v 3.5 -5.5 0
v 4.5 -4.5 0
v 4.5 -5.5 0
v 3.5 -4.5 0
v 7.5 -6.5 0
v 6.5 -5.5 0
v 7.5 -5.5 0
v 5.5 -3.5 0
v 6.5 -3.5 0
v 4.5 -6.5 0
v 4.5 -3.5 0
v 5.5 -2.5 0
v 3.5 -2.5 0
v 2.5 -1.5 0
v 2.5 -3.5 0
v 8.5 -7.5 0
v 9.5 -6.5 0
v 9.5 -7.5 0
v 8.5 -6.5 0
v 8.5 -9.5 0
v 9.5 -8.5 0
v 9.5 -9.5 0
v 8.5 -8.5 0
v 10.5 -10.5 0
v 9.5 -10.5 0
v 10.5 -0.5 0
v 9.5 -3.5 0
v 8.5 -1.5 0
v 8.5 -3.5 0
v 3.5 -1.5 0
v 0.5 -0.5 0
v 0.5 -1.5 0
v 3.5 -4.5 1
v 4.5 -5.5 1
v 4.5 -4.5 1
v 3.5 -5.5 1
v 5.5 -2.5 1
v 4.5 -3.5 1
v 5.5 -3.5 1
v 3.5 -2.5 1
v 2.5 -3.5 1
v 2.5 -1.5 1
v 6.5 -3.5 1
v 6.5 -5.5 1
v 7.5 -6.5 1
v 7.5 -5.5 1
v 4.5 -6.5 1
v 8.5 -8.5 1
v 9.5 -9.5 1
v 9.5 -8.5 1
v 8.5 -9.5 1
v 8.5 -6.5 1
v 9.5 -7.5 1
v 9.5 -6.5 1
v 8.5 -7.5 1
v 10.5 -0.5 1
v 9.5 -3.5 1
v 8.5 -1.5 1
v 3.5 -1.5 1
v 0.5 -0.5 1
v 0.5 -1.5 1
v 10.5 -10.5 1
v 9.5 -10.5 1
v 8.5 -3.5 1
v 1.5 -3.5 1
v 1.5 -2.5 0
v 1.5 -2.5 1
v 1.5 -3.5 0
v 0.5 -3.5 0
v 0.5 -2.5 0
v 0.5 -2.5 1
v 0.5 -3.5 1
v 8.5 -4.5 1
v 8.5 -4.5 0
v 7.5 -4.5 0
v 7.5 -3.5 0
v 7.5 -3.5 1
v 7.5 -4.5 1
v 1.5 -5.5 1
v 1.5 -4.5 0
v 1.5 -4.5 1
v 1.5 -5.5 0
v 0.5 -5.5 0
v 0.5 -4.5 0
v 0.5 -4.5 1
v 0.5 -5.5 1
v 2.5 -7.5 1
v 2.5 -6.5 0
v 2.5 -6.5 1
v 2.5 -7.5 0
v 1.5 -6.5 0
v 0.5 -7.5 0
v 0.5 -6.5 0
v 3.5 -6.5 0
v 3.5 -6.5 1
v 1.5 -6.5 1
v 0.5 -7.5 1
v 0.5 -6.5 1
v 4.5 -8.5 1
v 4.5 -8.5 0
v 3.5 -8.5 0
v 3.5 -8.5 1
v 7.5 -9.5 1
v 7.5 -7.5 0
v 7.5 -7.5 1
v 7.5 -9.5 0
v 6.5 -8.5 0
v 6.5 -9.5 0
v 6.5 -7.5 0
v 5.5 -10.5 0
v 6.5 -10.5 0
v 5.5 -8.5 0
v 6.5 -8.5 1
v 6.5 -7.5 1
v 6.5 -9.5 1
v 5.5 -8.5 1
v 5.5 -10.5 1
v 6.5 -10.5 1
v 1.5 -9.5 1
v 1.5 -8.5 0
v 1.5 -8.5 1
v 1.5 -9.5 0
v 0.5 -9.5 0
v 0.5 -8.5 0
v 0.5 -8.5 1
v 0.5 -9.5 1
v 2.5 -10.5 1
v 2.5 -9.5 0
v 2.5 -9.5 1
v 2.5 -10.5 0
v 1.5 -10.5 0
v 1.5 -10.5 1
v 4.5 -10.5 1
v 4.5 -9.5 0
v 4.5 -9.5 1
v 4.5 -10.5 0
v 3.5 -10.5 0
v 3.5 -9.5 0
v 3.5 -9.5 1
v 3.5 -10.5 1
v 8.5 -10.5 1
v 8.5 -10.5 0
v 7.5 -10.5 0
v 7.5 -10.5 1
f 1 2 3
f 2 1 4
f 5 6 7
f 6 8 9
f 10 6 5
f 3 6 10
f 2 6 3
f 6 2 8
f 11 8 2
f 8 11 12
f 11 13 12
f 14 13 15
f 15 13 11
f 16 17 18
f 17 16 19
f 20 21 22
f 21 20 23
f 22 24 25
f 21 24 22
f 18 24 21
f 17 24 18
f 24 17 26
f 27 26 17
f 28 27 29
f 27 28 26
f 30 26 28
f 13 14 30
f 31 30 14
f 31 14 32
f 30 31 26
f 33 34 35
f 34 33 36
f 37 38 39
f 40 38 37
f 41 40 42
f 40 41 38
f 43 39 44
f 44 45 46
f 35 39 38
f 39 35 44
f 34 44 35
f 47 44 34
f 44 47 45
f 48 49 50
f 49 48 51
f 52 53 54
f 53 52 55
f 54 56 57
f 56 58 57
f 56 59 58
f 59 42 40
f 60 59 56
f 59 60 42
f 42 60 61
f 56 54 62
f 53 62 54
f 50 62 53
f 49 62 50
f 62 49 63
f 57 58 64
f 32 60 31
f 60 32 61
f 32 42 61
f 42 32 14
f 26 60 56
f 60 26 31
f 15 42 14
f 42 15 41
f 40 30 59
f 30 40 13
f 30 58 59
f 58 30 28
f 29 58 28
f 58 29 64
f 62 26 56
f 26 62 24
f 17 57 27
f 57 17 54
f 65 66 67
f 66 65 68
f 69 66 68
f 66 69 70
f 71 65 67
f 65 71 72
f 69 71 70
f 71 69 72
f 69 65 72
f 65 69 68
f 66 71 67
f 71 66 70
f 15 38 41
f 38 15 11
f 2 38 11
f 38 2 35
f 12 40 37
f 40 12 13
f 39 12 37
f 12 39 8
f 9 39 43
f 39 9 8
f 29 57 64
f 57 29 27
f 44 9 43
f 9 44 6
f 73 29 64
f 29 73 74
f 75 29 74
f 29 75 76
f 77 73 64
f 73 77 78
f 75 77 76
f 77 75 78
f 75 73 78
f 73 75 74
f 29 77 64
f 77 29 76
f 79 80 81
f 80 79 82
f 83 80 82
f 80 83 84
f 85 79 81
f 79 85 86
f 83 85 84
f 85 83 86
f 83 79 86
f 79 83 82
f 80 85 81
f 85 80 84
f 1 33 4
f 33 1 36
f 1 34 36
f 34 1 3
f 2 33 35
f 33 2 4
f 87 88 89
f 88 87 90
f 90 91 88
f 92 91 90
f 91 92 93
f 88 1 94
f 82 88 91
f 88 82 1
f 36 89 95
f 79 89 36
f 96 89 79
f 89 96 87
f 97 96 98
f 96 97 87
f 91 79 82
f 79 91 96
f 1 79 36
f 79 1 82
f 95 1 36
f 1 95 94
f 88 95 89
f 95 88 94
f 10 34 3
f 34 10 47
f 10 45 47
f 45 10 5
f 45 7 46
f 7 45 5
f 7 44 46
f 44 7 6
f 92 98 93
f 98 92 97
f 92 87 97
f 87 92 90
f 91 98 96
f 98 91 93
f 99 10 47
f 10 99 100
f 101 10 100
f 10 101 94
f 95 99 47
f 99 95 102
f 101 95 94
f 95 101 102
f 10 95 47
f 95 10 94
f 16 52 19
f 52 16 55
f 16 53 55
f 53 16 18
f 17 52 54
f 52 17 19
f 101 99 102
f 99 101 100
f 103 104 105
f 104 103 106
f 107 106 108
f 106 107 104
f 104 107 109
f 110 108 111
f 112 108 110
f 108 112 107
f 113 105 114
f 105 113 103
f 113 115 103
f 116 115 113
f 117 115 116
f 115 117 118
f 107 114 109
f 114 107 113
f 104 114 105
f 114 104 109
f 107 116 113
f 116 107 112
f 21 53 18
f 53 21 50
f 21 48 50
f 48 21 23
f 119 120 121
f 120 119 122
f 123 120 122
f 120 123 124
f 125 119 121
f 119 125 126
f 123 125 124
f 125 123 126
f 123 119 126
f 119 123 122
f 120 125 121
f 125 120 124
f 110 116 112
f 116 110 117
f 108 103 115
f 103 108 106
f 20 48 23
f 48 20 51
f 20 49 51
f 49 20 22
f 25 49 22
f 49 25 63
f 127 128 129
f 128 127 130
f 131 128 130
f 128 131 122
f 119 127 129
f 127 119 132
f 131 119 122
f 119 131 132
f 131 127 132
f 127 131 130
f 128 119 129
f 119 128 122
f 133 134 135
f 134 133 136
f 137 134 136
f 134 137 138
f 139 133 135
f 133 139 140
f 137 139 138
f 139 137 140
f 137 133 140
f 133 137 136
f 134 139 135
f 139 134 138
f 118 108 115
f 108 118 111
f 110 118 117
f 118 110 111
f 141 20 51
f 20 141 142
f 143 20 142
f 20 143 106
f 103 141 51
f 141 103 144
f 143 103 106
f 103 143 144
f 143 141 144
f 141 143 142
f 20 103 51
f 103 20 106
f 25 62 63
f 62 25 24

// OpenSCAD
rotate([180,0,0])translate([0,0,-0.5]){
translate([1,1,0])  cube(size = [1,1,1], center=true);
translate([2,1,0])  cube(size = [1,1,1], center=true);
translate([3,1,0])  cube(size = [1,1,1], center=true);
translate([4,1,0])  cube(size = [1,1,1], center=true);
translate([5,1,0])  cube(size = [1,1,1], center=true);
translate([6,1,0])  cube(size = [1,1,1], center=true);
translate([7,1,0])  cube(size = [1,1,1], center=true);
translate([8,1,0])  cube(size = [1,1,1], center=true);
translate([9,1,0])  cube(size = [1,1,1], center=true);
translate([10,1,0])  cube(size = [1,1,1], center=true);
translate([10,1,0])  cube(size = [1,1,1], center=true);
translate([10,1,0])  cube(size = [1,1,1], center=true);
translate([3,2,0])  cube(size = [1,1,1], center=true);
translate([3,2,0])  cube(size = [1,1,1], center=true);
translate([3,2,0])  cube(size = [1,1,1], center=true);
translate([3,2,0])  cube(size = [1,1,1], center=true);
translate([3,2,0])  cube(size = [1,1,1], center=true);
translate([3,2,0])  cube(size = [1,1,1], center=true);
translate([9,2,0])  cube(size = [1,1,1], center=true);
translate([10,2,0])  cube(size = [1,1,1], center=true);
translate([1,3,0])  cube(size = [1,1,1], center=true);
translate([1,3,0])  cube(size = [1,1,1], center=true);
translate([3,3,0])  cube(size = [1,1,1], center=true);
translate([4,3,0])  cube(size = [1,1,1], center=true);
translate([5,3,0])  cube(size = [1,1,1], center=true);
translate([5,3,0])  cube(size = [1,1,1], center=true);
translate([5,3,0])  cube(size = [1,1,1], center=true);
translate([5,3,0])  cube(size = [1,1,1], center=true);
translate([9,3,0])  cube(size = [1,1,1], center=true);
translate([10,3,0])  cube(size = [1,1,1], center=true);
translate([10,3,0])  cube(size = [1,1,1], center=true);
translate([10,3,0])  cube(size = [1,1,1], center=true);
translate([10,3,0])  cube(size = [1,1,1], center=true);
translate([10,3,0])  cube(size = [1,1,1], center=true);
translate([5,4,0])  cube(size = [1,1,1], center=true);
translate([6,4,0])  cube(size = [1,1,1], center=true);
translate([6,4,0])  cube(size = [1,1,1], center=true);
translate([8,4,0])  cube(size = [1,1,1], center=true);
translate([8,4,0])  cube(size = [1,1,1], center=true);
translate([10,4,0])  cube(size = [1,1,1], center=true);
translate([1,5,0])  cube(size = [1,1,1], center=true);
translate([1,5,0])  cube(size = [1,1,1], center=true);
translate([1,5,0])  cube(size = [1,1,1], center=true);
translate([4,5,0])  cube(size = [1,1,1], center=true);
translate([5,5,0])  cube(size = [1,1,1], center=true);
translate([6,5,0])  cube(size = [1,1,1], center=true);
translate([6,5,0])  cube(size = [1,1,1], center=true);
translate([6,5,0])  cube(size = [1,1,1], center=true);
translate([6,5,0])  cube(size = [1,1,1], center=true);
translate([10,5,0])  cube(size = [1,1,1], center=true);
translate([10,5,0])  cube(size = [1,1,1], center=true);
translate([2,6,0])  cube(size = [1,1,1], center=true);
translate([3,6,0])  cube(size = [1,1,1], center=true);
translate([3,6,0])  cube(size = [1,1,1], center=true);
translate([5,6,0])  cube(size = [1,1,1], center=true);
translate([6,6,0])  cube(size = [1,1,1], center=true);
translate([7,6,0])  cube(size = [1,1,1], center=true);
translate([7,6,0])  cube(size = [1,1,1], center=true);
translate([7,6,0])  cube(size = [1,1,1], center=true);
translate([10,6,0])  cube(size = [1,1,1], center=true);
translate([1,7,0])  cube(size = [1,1,1], center=true);
translate([2,7,0])  cube(size = [1,1,1], center=true);
translate([2,7,0])  cube(size = [1,1,1], center=true);
translate([4,7,0])  cube(size = [1,1,1], center=true);
translate([4,7,0])  cube(size = [1,1,1], center=true);
translate([4,7,0])  cube(size = [1,1,1], center=true);
translate([4,7,0])  cube(size = [1,1,1], center=true);
translate([4,7,0])  cube(size = [1,1,1], center=true);
translate([9,7,0])  cube(size = [1,1,1], center=true);
translate([10,7,0])  cube(size = [1,1,1], center=true);
translate([10,7,0])  cube(size = [1,1,1], center=true);
translate([10,7,0])  cube(size = [1,1,1], center=true);
translate([10,7,0])  cube(size = [1,1,1], center=true);
translate([4,8,0])  cube(size = [1,1,1], center=true);
translate([4,8,0])  cube(size = [1,1,1], center=true);
translate([4,8,0])  cube(size = [1,1,1], center=true);
translate([7,8,0])  cube(size = [1,1,1], center=true);
translate([7,8,0])  cube(size = [1,1,1], center=true);
translate([7,8,0])  cube(size = [1,1,1], center=true);
translate([10,8,0])  cube(size = [1,1,1], center=true);
translate([1,9,0])  cube(size = [1,1,1], center=true);
translate([1,9,0])  cube(size = [1,1,1], center=true);
translate([1,9,0])  cube(size = [1,1,1], center=true);
translate([1,9,0])  cube(size = [1,1,1], center=true);
translate([1,9,0])  cube(size = [1,1,1], center=true);
translate([6,9,0])  cube(size = [1,1,1], center=true);
translate([7,9,0])  cube(size = [1,1,1], center=true);
translate([7,9,0])  cube(size = [1,1,1], center=true);
translate([9,9,0])  cube(size = [1,1,1], center=true);
translate([10,9,0])  cube(size = [1,1,1], center=true);
translate([10,9,0])  cube(size = [1,1,1], center=true);
translate([2,10,0])  cube(size = [1,1,1], center=true);
translate([2,10,0])  cube(size = [1,1,1], center=true);
translate([4,10,0])  cube(size = [1,1,1], center=true);
translate([4,10,0])  cube(size = [1,1,1], center=true);
translate([6,10,0])  cube(size = [1,1,1], center=true);
translate([6,10,0])  cube(size = [1,1,1], center=true);
translate([8,10,0])  cube(size = [1,1,1], center=true);
translate([8,10,0])  cube(size = [1,1,1], center=true);
translate([10,10,0])  cube(size = [1,1,1], center=true);
}
